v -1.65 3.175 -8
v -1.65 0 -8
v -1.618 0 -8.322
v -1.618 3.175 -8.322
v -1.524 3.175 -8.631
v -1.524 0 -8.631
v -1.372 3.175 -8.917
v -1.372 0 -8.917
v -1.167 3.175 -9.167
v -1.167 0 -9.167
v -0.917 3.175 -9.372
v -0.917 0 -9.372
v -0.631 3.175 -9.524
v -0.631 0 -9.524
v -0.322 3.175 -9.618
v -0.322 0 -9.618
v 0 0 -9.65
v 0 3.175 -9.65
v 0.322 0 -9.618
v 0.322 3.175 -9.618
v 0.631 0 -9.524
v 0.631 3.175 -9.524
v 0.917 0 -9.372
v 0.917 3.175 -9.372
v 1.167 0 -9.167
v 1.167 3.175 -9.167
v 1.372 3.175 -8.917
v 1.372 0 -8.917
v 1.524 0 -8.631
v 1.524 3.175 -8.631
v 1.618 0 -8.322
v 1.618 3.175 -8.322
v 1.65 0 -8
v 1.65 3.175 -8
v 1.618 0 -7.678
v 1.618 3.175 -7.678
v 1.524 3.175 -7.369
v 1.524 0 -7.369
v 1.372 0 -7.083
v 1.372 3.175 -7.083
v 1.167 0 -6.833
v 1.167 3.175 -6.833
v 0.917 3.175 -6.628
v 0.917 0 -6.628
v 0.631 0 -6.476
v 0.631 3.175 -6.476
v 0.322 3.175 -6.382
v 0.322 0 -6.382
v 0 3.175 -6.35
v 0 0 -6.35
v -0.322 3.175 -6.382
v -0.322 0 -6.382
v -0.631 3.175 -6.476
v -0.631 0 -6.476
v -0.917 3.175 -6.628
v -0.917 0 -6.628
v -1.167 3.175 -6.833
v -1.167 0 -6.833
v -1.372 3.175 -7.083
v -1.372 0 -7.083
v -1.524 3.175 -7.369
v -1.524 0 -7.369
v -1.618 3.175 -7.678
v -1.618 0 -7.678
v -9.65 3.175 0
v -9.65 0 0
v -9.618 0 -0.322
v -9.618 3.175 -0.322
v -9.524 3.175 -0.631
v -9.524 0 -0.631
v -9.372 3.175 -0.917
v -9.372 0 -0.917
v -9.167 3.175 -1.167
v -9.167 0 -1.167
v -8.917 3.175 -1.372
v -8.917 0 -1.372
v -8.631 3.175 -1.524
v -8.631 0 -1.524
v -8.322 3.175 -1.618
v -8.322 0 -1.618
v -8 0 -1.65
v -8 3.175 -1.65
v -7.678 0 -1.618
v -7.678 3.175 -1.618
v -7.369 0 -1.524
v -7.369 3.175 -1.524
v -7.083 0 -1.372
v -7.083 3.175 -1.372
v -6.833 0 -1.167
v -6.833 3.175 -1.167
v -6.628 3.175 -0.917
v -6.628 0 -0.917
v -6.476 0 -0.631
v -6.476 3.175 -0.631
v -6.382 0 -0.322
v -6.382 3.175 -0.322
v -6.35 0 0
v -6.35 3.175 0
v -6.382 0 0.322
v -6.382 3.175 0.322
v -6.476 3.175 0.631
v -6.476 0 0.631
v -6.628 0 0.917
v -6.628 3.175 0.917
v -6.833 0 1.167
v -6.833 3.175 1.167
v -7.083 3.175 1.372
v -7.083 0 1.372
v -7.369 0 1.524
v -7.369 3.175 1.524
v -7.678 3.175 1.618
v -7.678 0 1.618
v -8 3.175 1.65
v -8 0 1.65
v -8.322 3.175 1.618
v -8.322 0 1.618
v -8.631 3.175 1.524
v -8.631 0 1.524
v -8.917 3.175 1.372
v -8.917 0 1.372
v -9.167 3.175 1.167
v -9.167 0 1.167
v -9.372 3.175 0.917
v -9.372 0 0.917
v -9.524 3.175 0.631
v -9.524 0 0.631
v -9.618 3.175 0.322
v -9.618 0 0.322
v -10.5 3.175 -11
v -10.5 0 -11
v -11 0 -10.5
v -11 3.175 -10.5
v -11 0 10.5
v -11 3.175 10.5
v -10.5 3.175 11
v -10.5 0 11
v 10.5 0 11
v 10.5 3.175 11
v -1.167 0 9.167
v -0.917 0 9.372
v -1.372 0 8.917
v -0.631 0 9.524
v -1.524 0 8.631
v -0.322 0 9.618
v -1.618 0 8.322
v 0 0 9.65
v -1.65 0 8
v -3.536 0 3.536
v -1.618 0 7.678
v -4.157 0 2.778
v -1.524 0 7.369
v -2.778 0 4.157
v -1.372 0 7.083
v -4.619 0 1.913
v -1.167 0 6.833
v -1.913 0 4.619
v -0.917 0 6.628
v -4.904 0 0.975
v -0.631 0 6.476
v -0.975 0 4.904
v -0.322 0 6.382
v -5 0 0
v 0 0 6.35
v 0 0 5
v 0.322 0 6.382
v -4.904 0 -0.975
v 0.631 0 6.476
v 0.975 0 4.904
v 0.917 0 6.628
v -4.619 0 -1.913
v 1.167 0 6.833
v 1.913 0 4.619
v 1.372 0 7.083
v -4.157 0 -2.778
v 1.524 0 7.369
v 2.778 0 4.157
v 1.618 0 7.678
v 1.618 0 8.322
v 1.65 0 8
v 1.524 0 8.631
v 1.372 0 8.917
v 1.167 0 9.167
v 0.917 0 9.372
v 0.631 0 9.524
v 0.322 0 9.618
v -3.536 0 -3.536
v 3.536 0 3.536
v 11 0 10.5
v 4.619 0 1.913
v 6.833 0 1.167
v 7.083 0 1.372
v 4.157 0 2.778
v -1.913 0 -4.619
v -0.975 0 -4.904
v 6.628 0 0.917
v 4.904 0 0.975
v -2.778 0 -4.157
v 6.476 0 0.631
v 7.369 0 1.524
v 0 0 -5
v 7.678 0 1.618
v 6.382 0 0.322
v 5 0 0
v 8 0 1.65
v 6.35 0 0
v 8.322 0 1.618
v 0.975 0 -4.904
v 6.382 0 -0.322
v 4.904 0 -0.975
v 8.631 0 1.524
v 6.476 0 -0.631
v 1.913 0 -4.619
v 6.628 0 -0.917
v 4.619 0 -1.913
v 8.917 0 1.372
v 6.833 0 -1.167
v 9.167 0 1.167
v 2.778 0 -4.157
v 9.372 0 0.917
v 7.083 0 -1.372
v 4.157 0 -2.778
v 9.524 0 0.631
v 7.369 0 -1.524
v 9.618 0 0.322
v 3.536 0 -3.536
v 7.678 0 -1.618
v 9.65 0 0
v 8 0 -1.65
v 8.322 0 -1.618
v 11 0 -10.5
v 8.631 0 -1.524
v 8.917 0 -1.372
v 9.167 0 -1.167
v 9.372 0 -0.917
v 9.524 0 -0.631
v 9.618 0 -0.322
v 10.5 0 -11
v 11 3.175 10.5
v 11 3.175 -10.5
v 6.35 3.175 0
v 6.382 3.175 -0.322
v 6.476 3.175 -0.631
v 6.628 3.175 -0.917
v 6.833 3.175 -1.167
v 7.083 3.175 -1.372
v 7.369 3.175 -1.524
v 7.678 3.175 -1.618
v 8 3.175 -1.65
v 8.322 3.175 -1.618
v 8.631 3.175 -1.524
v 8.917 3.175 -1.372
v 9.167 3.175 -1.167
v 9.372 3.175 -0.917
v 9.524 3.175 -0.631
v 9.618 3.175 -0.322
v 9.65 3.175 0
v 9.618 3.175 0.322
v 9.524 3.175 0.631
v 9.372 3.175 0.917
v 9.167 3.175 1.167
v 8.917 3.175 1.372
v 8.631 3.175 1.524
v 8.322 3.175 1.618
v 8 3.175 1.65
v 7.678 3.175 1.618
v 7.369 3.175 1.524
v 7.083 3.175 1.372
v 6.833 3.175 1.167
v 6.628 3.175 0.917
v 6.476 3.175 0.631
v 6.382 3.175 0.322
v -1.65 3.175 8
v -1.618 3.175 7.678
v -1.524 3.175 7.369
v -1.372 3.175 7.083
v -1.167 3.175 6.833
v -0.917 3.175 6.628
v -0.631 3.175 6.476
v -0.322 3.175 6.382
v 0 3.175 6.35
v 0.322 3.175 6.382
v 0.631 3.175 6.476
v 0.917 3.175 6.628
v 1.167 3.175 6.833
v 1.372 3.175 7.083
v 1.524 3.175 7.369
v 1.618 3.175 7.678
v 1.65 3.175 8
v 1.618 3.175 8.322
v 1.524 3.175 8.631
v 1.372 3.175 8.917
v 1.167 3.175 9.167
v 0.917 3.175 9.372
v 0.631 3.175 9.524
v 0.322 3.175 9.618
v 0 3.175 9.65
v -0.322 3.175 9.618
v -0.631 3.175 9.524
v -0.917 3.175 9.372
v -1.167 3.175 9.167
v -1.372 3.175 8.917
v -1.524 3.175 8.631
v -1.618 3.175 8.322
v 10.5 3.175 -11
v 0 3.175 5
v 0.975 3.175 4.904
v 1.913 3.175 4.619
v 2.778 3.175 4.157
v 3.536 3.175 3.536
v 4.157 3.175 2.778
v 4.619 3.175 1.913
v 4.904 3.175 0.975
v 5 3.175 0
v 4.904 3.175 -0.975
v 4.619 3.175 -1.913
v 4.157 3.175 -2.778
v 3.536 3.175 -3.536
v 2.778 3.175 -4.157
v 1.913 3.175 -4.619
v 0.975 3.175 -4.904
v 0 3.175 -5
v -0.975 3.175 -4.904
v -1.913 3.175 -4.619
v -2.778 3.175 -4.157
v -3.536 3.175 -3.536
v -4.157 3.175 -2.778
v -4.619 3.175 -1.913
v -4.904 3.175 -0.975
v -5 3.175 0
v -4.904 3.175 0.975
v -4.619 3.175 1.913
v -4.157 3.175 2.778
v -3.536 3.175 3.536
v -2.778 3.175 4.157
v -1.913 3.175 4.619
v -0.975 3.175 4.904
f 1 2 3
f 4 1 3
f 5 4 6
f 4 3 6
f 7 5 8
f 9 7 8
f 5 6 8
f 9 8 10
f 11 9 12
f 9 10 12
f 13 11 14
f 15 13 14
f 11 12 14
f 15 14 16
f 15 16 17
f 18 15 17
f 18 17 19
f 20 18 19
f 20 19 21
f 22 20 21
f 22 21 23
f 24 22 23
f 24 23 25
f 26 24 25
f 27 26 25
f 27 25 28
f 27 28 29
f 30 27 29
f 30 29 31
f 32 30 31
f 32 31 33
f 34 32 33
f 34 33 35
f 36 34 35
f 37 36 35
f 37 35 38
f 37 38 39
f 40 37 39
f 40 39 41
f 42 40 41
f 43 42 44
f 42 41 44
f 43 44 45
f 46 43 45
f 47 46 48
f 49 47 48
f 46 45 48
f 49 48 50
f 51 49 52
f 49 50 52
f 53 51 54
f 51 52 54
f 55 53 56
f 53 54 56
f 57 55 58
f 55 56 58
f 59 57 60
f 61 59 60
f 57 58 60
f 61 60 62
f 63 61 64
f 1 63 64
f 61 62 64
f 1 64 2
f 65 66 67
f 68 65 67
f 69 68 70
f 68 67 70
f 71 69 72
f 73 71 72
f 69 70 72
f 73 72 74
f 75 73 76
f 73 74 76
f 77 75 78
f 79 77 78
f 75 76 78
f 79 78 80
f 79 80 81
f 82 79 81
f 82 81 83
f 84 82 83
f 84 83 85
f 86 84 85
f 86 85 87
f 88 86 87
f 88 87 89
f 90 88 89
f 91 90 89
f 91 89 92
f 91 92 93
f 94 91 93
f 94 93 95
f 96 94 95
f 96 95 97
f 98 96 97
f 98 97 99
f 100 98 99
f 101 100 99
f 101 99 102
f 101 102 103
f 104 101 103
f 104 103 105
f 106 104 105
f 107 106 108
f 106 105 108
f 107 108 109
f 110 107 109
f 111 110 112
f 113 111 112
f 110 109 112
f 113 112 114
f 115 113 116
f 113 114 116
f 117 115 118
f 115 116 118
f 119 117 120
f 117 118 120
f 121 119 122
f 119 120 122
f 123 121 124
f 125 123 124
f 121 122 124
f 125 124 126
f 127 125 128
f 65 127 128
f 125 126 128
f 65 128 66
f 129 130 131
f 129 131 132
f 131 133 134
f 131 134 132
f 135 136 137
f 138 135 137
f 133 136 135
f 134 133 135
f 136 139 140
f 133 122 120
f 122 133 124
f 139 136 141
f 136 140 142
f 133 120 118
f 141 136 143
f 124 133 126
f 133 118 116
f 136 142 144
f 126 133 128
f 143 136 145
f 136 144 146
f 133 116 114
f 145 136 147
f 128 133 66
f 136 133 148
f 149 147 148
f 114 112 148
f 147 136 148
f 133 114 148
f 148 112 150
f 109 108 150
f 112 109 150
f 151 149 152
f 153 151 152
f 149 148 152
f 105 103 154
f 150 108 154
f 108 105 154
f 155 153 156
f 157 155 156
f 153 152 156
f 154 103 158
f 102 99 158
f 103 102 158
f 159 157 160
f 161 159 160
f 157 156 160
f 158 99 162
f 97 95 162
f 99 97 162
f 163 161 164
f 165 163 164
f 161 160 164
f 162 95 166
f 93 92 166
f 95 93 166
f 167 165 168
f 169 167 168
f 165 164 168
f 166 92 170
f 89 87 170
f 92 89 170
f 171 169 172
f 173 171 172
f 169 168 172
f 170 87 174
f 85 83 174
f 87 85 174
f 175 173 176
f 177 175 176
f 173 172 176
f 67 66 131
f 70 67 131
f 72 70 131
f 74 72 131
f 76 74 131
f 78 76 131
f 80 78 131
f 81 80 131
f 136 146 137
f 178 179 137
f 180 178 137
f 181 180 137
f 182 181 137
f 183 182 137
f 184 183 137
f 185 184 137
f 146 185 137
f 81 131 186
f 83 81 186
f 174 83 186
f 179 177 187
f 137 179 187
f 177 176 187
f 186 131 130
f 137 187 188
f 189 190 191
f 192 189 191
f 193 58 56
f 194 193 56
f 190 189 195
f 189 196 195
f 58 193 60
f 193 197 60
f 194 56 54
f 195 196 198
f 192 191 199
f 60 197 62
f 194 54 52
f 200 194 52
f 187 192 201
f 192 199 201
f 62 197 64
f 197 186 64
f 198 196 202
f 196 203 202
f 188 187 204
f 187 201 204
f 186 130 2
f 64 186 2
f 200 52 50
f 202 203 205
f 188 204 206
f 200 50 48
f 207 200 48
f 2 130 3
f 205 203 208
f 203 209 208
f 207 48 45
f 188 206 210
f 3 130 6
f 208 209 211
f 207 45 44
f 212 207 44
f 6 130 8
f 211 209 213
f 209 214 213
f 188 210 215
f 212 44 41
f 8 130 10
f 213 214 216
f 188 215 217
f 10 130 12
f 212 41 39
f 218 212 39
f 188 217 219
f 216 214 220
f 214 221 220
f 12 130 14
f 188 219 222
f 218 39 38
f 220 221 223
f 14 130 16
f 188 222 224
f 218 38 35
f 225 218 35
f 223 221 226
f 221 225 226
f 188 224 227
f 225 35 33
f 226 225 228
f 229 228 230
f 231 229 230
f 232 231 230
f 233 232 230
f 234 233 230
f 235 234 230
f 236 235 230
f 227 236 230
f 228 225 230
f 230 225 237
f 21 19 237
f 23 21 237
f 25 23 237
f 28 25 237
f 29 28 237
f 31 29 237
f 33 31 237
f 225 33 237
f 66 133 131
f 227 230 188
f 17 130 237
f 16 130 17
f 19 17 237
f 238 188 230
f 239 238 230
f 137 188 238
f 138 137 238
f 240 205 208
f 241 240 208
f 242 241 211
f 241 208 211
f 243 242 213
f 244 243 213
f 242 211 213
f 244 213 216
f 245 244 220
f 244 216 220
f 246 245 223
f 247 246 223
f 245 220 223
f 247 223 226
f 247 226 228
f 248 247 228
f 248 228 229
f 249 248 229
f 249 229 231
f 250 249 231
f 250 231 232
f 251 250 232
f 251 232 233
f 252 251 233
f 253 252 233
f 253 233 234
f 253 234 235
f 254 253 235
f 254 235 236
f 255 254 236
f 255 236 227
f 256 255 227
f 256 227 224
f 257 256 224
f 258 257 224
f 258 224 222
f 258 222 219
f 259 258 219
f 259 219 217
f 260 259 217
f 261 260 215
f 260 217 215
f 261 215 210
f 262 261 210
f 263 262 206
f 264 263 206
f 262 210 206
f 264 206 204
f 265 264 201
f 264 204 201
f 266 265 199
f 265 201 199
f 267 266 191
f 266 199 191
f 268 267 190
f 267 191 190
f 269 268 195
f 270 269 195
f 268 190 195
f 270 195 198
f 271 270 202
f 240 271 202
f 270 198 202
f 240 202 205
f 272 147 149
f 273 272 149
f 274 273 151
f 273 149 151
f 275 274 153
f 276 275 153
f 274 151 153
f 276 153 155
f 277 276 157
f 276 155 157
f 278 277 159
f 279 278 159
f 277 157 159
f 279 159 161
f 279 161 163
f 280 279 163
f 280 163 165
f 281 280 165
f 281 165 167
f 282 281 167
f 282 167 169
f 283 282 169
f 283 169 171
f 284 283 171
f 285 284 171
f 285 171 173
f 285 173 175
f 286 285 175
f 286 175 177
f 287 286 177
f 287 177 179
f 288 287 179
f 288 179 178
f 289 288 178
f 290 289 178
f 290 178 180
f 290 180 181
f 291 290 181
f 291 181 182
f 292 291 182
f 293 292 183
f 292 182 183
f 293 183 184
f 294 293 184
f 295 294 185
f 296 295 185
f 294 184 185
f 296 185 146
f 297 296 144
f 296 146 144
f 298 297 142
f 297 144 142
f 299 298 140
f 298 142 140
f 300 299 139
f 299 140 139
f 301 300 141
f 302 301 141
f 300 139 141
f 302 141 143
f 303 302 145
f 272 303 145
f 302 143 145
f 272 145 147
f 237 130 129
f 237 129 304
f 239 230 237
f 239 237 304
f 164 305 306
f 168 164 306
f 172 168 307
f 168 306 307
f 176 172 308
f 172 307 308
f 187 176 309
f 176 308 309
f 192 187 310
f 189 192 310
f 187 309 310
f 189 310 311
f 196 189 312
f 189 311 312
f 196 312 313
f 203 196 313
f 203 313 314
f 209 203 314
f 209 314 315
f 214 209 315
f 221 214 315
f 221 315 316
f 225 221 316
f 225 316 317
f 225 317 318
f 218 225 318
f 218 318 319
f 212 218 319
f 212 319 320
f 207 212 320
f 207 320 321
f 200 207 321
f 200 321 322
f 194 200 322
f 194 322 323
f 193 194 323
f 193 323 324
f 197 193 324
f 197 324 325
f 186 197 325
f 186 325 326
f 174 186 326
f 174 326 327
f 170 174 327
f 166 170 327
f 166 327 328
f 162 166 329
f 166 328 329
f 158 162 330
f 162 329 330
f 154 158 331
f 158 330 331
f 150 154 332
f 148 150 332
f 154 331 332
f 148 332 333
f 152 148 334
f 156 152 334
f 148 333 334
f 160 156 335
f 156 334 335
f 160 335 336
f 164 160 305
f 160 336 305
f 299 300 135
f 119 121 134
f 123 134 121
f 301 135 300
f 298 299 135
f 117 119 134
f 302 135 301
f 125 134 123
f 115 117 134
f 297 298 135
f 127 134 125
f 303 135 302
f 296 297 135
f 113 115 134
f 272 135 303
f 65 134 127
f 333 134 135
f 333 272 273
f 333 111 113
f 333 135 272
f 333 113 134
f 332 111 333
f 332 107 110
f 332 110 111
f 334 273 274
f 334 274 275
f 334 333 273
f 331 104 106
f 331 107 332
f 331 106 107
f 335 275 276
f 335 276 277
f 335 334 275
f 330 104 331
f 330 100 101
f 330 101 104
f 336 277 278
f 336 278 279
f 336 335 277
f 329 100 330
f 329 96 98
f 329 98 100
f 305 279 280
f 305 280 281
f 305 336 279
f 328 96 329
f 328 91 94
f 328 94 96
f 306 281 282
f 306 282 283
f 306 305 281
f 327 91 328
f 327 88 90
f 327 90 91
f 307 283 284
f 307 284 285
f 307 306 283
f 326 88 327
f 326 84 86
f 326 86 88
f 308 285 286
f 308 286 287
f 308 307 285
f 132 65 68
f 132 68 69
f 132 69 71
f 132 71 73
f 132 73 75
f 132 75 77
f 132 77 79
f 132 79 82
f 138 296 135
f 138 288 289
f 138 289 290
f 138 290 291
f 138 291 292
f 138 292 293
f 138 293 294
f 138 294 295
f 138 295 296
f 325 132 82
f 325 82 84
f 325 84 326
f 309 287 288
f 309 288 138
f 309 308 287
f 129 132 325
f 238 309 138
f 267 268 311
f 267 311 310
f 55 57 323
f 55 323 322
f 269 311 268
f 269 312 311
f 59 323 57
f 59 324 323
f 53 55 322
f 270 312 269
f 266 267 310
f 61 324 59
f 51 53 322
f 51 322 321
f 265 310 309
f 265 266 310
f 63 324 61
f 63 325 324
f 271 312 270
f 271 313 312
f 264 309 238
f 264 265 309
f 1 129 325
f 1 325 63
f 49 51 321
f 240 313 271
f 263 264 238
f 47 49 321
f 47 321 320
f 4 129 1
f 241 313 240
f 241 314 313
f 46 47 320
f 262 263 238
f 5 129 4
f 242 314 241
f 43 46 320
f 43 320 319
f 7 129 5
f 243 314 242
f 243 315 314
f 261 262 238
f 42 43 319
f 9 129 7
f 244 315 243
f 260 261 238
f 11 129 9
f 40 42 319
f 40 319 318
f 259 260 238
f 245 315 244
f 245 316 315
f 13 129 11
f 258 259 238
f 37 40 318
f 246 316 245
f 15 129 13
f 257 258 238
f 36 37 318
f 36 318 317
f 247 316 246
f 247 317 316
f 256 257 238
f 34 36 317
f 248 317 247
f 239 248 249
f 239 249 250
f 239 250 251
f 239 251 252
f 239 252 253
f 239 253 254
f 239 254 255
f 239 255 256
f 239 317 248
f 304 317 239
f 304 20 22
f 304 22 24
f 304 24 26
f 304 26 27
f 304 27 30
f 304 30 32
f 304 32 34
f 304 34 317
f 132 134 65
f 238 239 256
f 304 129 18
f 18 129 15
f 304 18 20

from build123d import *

# Parameters (mm, degrees)
SKETCH1_W                 = 22
SKETCH1_H                 = 22
BOSS_EXTRUDE1_DEPTH       = 3.175
SKETCH2_R                 = 5
CUT_EXTRUDE1_DEPTH        = 16.877047112
CHAMFER1_SIZE             = 0.5
F_3_0MM_DOWEL_HOLE1_D     = 3.3
F_3_0MM_DOWEL_HOLE1_DEPTH = 5
F_3_0MM_DOWEL_HOLE1_TIP   = 0.991420021


with BuildPart() as part:
    # Sketch1 → Boss-Extrude1 (new body)
    with BuildSketch(Plane(origin=(0, 0, 0), x_dir=(1, 0, 0), z_dir=(0, 1, 0))):
        Rectangle(SKETCH1_W, SKETCH1_H)
    extrude(amount=BOSS_EXTRUDE1_DEPTH)

    # Sketch2 → Cut-Extrude1 (cut, through all)
    with BuildSketch(Plane(origin=(0, 3.175, 0), x_dir=(1, 0, 0), z_dir=(0, 1, 0))):
        with Locations(Location((0, 0, 0), (0, 0, 270))):
            Circle(SKETCH2_R)
    extrude(amount=-CUT_EXTRUDE1_DEPTH, mode=Mode.SUBTRACT)

    # Chamfer1
    chamfer1_edges = [part.edges().sort_by_distance(p)[0] for p in [
        (11, 1.5875, 11),
        (-11, 1.5875, 11),
        (-11, 1.5875, -11),
        (11, 1.5875, -11),
    ]]
    chamfer(chamfer1_edges, length=CHAMFER1_SIZE)

    # Ø3.0mm Dowel Hole1
    with Locations(Plane(origin=(0, 3.175, 0), x_dir=(1, 0, 0), z_dir=(0, 1, 0))):
        with Locations((0, 8), (8, 0), (0, -8), (-8, 0)):
            Hole(F_3_0MM_DOWEL_HOLE1_D / 2, depth=F_3_0MM_DOWEL_HOLE1_DEPTH)
            with Locations((0, 0, -(F_3_0MM_DOWEL_HOLE1_DEPTH + F_3_0MM_DOWEL_HOLE1_TIP / 2))):  # 118° drill point
                Cone(0, F_3_0MM_DOWEL_HOLE1_D / 2, F_3_0MM_DOWEL_HOLE1_TIP, mode=Mode.SUBTRACT)


solid = part.part
